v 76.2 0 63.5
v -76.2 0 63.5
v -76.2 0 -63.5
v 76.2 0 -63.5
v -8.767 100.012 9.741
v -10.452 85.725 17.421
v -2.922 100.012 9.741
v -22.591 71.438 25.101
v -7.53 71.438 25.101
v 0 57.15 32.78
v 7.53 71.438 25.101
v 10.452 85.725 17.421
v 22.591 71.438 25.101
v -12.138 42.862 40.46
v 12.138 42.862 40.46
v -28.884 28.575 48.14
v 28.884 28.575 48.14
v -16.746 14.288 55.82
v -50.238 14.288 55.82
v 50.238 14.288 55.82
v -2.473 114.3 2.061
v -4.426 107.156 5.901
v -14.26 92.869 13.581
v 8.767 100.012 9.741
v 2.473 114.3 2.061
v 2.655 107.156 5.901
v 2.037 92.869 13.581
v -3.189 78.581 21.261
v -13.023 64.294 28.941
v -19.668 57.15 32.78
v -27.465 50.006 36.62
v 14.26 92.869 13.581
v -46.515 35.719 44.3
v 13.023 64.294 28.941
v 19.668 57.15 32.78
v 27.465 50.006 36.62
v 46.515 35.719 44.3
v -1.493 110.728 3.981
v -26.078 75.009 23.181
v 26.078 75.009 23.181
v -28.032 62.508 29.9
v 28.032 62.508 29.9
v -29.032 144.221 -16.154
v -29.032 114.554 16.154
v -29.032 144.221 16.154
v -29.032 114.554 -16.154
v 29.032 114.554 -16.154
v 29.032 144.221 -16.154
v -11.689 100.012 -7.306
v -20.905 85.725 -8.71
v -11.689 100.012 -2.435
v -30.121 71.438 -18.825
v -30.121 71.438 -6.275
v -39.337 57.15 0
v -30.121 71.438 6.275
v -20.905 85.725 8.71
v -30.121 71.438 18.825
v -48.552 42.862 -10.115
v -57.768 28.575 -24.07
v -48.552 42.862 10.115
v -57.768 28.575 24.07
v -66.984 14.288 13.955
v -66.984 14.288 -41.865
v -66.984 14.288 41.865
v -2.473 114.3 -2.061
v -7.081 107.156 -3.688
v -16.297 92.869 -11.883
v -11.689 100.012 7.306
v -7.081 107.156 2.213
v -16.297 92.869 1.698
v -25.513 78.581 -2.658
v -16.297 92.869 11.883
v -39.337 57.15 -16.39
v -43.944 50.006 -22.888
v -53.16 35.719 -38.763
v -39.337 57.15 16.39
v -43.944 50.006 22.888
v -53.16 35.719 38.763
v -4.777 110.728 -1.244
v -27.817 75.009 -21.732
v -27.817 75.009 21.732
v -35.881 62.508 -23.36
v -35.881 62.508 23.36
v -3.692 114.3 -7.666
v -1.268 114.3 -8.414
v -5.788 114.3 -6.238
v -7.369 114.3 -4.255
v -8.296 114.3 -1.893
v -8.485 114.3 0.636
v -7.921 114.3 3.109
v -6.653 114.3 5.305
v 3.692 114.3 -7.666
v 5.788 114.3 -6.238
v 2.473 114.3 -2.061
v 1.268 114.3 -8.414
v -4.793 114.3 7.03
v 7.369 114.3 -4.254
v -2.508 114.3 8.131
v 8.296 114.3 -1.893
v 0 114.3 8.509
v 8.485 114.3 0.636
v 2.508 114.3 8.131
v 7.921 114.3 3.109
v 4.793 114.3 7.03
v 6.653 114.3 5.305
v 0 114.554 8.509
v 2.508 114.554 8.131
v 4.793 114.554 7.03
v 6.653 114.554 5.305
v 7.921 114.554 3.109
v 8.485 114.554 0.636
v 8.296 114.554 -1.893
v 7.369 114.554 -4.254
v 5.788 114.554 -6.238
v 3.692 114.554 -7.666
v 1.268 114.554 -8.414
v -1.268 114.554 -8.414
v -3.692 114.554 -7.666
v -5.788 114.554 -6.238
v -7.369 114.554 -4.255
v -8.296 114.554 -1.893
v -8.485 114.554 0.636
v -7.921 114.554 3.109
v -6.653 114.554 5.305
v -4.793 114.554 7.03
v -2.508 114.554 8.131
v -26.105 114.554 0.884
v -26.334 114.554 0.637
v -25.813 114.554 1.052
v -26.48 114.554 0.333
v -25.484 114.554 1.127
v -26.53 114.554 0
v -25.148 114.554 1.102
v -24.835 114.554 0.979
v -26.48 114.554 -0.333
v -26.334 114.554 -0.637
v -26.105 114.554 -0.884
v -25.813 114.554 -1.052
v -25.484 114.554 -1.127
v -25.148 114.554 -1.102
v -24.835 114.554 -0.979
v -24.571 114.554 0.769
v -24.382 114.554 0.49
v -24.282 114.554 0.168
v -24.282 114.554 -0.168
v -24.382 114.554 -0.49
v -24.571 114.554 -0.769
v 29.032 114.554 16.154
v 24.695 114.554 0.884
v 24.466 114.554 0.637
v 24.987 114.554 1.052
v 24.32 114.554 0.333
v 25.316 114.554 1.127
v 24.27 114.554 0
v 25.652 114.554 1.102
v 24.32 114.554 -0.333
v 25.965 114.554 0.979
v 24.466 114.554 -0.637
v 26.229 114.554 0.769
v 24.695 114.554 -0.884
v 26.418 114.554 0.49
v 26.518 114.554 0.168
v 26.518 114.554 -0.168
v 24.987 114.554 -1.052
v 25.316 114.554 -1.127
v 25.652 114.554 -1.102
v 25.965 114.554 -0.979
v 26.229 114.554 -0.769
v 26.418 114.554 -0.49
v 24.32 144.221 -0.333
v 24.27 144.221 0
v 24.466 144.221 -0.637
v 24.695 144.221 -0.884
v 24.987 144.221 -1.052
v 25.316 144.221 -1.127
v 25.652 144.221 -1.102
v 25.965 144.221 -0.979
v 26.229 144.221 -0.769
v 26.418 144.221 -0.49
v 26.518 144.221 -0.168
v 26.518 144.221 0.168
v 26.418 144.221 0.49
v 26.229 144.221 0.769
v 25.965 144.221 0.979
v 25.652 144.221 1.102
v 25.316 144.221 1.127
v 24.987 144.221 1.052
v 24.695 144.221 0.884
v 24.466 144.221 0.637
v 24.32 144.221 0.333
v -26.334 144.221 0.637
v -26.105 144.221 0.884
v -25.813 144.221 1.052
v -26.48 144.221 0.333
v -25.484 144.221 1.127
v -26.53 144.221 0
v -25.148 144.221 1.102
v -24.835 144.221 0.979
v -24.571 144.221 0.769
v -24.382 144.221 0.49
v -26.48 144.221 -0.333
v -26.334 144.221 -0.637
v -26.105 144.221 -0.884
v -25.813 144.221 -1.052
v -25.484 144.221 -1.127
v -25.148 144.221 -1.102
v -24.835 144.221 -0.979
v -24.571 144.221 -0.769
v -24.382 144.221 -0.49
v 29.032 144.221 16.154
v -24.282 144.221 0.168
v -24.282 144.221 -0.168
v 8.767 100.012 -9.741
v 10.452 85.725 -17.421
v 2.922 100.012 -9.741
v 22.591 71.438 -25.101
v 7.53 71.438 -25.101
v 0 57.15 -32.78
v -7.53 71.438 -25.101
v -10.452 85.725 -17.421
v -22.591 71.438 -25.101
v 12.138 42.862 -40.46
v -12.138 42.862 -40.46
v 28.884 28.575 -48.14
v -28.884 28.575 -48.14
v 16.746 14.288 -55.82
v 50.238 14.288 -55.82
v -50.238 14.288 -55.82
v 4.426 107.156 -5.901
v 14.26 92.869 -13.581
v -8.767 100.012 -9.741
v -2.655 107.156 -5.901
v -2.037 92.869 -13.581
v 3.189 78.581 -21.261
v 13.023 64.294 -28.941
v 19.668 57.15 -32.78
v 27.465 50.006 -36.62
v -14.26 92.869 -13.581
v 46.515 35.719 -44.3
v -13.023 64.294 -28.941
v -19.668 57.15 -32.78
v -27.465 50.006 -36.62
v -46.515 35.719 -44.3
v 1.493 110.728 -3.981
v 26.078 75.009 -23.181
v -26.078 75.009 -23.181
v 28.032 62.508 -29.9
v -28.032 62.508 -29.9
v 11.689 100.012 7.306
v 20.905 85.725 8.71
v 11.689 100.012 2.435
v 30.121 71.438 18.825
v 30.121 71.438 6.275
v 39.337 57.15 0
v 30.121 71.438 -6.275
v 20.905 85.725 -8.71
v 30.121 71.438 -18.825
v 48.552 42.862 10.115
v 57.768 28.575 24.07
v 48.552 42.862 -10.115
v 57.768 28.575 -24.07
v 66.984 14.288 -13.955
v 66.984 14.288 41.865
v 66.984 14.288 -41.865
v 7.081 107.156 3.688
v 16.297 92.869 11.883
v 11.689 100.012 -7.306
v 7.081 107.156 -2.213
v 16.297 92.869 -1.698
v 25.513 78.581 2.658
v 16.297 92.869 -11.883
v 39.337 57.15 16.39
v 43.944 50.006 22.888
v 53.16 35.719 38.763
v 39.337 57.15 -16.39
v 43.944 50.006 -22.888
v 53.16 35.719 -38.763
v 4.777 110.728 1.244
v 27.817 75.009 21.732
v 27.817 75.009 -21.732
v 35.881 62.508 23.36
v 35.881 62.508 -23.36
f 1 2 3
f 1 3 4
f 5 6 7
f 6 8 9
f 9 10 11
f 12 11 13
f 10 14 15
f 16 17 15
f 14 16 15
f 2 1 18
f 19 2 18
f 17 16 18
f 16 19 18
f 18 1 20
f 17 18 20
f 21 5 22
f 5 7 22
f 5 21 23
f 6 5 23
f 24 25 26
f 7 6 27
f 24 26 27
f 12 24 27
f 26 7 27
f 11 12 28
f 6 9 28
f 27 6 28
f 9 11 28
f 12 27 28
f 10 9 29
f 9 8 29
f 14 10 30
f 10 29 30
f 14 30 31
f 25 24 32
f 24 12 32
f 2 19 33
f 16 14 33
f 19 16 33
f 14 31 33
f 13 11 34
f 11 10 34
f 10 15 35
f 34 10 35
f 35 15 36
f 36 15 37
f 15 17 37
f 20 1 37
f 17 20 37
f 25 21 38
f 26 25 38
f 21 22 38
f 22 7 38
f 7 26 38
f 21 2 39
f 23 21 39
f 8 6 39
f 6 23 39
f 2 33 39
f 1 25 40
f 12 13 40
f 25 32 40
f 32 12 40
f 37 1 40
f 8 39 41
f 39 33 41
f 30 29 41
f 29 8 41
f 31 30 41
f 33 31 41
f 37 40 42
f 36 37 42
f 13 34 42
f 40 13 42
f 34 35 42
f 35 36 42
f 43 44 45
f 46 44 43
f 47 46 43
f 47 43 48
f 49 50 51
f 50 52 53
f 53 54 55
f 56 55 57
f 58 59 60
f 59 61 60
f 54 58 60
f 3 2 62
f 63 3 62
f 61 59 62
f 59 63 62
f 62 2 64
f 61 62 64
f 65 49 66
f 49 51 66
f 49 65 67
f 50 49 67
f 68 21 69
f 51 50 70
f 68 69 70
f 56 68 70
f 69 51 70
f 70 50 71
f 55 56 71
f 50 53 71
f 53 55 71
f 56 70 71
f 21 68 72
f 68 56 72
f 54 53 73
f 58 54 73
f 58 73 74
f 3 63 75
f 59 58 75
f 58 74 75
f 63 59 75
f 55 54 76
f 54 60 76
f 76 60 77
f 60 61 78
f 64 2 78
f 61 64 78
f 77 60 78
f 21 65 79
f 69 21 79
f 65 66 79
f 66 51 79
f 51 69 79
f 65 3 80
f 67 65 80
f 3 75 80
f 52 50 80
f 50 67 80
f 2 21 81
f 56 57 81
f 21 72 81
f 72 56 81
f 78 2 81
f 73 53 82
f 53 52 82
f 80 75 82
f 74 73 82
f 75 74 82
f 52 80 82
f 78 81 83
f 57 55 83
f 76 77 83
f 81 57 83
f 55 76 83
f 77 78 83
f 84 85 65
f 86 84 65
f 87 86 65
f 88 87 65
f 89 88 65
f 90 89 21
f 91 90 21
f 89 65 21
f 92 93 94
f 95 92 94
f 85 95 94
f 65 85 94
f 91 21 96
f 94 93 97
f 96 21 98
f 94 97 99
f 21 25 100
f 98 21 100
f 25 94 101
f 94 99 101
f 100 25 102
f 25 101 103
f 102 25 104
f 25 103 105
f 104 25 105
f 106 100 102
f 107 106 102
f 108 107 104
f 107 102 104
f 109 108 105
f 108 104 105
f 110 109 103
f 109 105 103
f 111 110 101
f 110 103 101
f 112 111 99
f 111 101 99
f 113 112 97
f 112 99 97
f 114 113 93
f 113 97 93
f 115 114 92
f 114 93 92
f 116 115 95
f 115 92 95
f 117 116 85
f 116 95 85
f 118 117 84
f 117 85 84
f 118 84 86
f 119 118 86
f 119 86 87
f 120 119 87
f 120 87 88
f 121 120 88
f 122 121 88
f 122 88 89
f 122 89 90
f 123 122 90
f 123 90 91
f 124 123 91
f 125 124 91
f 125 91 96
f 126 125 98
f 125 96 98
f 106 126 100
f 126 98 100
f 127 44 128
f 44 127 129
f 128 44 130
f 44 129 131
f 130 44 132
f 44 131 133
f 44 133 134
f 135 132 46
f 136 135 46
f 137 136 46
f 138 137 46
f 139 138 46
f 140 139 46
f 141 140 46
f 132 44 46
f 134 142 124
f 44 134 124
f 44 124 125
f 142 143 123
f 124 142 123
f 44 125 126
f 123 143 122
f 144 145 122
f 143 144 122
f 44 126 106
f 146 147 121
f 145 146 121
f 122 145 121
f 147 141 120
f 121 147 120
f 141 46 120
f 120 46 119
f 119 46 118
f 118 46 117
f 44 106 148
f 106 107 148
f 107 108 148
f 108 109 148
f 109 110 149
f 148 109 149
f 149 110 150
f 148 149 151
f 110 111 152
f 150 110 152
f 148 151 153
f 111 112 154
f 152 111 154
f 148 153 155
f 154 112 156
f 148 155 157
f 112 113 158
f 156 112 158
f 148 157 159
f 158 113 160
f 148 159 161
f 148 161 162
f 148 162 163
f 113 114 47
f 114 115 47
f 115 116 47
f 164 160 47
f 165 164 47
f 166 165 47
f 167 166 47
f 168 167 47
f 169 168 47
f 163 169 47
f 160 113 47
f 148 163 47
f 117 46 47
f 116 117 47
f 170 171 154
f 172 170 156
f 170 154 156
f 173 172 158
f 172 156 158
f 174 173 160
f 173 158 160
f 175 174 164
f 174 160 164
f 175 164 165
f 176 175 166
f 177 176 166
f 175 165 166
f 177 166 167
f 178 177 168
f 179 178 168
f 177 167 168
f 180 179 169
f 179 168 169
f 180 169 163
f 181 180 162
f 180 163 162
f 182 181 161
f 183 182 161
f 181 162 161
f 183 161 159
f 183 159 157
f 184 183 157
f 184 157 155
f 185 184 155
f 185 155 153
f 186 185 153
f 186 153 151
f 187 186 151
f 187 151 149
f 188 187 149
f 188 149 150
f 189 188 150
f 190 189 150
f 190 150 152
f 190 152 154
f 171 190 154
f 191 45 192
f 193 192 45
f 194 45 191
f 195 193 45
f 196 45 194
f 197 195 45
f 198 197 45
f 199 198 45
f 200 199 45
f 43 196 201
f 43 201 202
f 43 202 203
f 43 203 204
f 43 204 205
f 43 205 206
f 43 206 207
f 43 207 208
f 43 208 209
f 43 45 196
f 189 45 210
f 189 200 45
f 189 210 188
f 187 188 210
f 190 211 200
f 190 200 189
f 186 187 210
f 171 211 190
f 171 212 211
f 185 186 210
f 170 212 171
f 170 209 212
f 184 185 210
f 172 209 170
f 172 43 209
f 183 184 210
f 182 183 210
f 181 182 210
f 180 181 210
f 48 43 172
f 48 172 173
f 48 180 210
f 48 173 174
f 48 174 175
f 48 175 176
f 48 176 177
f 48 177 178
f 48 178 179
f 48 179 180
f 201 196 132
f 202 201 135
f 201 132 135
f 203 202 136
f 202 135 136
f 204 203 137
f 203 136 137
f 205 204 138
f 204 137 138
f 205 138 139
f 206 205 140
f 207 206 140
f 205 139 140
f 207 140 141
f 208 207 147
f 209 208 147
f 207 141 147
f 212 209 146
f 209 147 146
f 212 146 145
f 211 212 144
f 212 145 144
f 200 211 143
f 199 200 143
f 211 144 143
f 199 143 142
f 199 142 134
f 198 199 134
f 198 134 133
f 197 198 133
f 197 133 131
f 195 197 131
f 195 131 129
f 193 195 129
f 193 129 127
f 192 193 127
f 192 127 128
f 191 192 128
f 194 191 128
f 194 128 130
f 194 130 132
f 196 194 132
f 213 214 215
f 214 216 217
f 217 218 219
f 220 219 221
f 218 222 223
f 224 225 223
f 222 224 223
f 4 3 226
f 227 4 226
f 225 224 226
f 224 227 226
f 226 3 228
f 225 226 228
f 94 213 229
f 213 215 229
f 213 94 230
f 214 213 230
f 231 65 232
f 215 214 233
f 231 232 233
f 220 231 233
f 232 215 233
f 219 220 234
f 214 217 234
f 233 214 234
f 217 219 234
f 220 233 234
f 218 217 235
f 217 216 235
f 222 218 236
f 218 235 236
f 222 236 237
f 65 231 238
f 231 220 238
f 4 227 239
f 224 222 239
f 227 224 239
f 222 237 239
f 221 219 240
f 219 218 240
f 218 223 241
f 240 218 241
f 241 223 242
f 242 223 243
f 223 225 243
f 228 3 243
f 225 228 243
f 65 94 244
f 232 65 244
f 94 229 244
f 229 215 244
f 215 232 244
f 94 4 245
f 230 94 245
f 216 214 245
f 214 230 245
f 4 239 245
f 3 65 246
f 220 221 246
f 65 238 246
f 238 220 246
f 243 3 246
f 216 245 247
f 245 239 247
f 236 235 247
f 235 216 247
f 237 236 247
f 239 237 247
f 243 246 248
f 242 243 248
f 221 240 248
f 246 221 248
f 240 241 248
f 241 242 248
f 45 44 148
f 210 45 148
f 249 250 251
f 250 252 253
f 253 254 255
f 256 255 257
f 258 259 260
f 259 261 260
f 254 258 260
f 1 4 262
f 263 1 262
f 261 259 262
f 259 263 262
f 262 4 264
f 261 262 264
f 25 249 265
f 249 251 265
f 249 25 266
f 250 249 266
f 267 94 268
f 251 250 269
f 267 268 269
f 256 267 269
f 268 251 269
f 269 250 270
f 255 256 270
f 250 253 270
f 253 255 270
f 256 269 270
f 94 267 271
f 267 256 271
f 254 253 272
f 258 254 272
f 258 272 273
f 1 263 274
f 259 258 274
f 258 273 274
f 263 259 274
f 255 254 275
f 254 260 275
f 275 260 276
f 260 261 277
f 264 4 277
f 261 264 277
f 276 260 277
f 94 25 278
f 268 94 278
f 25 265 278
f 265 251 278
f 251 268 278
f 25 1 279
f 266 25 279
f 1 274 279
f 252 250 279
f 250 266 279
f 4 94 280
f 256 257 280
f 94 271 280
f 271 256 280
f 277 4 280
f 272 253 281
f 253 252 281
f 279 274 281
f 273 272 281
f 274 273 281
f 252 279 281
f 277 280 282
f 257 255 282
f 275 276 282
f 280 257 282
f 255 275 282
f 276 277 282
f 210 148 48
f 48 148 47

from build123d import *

# Parameters (mm, degrees)
SKETCH3_R                 = 8.509
CAMERA_LENS_DEPTH         = 0.254
SKETCH4_W                 = 58.0644
SKETCH4_H                 = 32.3088
CAMERA_HOLDER_DEPTH       = 29.6672
F_4_40_TAPPED_HOLE1_D     = 2.2606
F_4_40_TAPPED_HOLE1_DEPTH = 29.6672


with BuildPart() as part:
    # Sketch2 → FOV section 0
    with BuildSketch(Plane(origin=(0, 114.3, 0), x_dir=(1, 0, 0), z_dir=(0, 1, 0))):
        with BuildLine():
            Line((-2.473079913, -2.060899928), (2.473079913, -2.060899928))
            Line((2.473079913, -2.060899928), (2.473079913, 2.060899928))
            Line((2.473079913, 2.060899928), (-2.473079913, 2.060899928))
            Line((-2.473079913, 2.060899928), (-2.473079913, -2.060899928))
        make_face()
    # Sketch1 → FOV section 1
    with BuildSketch(Plane(origin=(0, 0, 0), x_dir=(1, 0, 0), z_dir=(0, 1, 0))):
        with BuildLine():
            Line((-76.2, -63.5), (76.2, -63.5))
            Line((76.2, -63.5), (76.2, 63.5))
            Line((76.2, 63.5), (-76.2, 63.5))
            Line((-76.2, 63.5), (-76.2, -63.5))
        make_face()
    loft()

    # Sketch3 → camera lens (add)
    with BuildSketch(Plane(origin=(0, 114.3, 0), x_dir=(1, 0, 0), z_dir=(0, 1, 0))):
        with Locations(Location((0, 0, 0), (0, 0, 270))):
            Circle(SKETCH3_R)
    extrude(amount=CAMERA_LENS_DEPTH)

    # Sketch4 → camera holder (add)
    with BuildSketch(Plane(origin=(0, 114.554, 0), x_dir=(1, 0, 0), z_dir=(0, 1, 0))):
        Rectangle(SKETCH4_W, SKETCH4_H)
    extrude(amount=CAMERA_HOLDER_DEPTH)

    # #4-40 Tapped Hole1
    with Locations(Plane(origin=(0, 144.2212, 0), x_dir=(1, 0, 0), z_dir=(0, 1, 0))):
        with Locations((-25.4, 0), (25.4, 0)):
            Hole(F_4_40_TAPPED_HOLE1_D / 2, depth=F_4_40_TAPPED_HOLE1_DEPTH)


solid = part.part
